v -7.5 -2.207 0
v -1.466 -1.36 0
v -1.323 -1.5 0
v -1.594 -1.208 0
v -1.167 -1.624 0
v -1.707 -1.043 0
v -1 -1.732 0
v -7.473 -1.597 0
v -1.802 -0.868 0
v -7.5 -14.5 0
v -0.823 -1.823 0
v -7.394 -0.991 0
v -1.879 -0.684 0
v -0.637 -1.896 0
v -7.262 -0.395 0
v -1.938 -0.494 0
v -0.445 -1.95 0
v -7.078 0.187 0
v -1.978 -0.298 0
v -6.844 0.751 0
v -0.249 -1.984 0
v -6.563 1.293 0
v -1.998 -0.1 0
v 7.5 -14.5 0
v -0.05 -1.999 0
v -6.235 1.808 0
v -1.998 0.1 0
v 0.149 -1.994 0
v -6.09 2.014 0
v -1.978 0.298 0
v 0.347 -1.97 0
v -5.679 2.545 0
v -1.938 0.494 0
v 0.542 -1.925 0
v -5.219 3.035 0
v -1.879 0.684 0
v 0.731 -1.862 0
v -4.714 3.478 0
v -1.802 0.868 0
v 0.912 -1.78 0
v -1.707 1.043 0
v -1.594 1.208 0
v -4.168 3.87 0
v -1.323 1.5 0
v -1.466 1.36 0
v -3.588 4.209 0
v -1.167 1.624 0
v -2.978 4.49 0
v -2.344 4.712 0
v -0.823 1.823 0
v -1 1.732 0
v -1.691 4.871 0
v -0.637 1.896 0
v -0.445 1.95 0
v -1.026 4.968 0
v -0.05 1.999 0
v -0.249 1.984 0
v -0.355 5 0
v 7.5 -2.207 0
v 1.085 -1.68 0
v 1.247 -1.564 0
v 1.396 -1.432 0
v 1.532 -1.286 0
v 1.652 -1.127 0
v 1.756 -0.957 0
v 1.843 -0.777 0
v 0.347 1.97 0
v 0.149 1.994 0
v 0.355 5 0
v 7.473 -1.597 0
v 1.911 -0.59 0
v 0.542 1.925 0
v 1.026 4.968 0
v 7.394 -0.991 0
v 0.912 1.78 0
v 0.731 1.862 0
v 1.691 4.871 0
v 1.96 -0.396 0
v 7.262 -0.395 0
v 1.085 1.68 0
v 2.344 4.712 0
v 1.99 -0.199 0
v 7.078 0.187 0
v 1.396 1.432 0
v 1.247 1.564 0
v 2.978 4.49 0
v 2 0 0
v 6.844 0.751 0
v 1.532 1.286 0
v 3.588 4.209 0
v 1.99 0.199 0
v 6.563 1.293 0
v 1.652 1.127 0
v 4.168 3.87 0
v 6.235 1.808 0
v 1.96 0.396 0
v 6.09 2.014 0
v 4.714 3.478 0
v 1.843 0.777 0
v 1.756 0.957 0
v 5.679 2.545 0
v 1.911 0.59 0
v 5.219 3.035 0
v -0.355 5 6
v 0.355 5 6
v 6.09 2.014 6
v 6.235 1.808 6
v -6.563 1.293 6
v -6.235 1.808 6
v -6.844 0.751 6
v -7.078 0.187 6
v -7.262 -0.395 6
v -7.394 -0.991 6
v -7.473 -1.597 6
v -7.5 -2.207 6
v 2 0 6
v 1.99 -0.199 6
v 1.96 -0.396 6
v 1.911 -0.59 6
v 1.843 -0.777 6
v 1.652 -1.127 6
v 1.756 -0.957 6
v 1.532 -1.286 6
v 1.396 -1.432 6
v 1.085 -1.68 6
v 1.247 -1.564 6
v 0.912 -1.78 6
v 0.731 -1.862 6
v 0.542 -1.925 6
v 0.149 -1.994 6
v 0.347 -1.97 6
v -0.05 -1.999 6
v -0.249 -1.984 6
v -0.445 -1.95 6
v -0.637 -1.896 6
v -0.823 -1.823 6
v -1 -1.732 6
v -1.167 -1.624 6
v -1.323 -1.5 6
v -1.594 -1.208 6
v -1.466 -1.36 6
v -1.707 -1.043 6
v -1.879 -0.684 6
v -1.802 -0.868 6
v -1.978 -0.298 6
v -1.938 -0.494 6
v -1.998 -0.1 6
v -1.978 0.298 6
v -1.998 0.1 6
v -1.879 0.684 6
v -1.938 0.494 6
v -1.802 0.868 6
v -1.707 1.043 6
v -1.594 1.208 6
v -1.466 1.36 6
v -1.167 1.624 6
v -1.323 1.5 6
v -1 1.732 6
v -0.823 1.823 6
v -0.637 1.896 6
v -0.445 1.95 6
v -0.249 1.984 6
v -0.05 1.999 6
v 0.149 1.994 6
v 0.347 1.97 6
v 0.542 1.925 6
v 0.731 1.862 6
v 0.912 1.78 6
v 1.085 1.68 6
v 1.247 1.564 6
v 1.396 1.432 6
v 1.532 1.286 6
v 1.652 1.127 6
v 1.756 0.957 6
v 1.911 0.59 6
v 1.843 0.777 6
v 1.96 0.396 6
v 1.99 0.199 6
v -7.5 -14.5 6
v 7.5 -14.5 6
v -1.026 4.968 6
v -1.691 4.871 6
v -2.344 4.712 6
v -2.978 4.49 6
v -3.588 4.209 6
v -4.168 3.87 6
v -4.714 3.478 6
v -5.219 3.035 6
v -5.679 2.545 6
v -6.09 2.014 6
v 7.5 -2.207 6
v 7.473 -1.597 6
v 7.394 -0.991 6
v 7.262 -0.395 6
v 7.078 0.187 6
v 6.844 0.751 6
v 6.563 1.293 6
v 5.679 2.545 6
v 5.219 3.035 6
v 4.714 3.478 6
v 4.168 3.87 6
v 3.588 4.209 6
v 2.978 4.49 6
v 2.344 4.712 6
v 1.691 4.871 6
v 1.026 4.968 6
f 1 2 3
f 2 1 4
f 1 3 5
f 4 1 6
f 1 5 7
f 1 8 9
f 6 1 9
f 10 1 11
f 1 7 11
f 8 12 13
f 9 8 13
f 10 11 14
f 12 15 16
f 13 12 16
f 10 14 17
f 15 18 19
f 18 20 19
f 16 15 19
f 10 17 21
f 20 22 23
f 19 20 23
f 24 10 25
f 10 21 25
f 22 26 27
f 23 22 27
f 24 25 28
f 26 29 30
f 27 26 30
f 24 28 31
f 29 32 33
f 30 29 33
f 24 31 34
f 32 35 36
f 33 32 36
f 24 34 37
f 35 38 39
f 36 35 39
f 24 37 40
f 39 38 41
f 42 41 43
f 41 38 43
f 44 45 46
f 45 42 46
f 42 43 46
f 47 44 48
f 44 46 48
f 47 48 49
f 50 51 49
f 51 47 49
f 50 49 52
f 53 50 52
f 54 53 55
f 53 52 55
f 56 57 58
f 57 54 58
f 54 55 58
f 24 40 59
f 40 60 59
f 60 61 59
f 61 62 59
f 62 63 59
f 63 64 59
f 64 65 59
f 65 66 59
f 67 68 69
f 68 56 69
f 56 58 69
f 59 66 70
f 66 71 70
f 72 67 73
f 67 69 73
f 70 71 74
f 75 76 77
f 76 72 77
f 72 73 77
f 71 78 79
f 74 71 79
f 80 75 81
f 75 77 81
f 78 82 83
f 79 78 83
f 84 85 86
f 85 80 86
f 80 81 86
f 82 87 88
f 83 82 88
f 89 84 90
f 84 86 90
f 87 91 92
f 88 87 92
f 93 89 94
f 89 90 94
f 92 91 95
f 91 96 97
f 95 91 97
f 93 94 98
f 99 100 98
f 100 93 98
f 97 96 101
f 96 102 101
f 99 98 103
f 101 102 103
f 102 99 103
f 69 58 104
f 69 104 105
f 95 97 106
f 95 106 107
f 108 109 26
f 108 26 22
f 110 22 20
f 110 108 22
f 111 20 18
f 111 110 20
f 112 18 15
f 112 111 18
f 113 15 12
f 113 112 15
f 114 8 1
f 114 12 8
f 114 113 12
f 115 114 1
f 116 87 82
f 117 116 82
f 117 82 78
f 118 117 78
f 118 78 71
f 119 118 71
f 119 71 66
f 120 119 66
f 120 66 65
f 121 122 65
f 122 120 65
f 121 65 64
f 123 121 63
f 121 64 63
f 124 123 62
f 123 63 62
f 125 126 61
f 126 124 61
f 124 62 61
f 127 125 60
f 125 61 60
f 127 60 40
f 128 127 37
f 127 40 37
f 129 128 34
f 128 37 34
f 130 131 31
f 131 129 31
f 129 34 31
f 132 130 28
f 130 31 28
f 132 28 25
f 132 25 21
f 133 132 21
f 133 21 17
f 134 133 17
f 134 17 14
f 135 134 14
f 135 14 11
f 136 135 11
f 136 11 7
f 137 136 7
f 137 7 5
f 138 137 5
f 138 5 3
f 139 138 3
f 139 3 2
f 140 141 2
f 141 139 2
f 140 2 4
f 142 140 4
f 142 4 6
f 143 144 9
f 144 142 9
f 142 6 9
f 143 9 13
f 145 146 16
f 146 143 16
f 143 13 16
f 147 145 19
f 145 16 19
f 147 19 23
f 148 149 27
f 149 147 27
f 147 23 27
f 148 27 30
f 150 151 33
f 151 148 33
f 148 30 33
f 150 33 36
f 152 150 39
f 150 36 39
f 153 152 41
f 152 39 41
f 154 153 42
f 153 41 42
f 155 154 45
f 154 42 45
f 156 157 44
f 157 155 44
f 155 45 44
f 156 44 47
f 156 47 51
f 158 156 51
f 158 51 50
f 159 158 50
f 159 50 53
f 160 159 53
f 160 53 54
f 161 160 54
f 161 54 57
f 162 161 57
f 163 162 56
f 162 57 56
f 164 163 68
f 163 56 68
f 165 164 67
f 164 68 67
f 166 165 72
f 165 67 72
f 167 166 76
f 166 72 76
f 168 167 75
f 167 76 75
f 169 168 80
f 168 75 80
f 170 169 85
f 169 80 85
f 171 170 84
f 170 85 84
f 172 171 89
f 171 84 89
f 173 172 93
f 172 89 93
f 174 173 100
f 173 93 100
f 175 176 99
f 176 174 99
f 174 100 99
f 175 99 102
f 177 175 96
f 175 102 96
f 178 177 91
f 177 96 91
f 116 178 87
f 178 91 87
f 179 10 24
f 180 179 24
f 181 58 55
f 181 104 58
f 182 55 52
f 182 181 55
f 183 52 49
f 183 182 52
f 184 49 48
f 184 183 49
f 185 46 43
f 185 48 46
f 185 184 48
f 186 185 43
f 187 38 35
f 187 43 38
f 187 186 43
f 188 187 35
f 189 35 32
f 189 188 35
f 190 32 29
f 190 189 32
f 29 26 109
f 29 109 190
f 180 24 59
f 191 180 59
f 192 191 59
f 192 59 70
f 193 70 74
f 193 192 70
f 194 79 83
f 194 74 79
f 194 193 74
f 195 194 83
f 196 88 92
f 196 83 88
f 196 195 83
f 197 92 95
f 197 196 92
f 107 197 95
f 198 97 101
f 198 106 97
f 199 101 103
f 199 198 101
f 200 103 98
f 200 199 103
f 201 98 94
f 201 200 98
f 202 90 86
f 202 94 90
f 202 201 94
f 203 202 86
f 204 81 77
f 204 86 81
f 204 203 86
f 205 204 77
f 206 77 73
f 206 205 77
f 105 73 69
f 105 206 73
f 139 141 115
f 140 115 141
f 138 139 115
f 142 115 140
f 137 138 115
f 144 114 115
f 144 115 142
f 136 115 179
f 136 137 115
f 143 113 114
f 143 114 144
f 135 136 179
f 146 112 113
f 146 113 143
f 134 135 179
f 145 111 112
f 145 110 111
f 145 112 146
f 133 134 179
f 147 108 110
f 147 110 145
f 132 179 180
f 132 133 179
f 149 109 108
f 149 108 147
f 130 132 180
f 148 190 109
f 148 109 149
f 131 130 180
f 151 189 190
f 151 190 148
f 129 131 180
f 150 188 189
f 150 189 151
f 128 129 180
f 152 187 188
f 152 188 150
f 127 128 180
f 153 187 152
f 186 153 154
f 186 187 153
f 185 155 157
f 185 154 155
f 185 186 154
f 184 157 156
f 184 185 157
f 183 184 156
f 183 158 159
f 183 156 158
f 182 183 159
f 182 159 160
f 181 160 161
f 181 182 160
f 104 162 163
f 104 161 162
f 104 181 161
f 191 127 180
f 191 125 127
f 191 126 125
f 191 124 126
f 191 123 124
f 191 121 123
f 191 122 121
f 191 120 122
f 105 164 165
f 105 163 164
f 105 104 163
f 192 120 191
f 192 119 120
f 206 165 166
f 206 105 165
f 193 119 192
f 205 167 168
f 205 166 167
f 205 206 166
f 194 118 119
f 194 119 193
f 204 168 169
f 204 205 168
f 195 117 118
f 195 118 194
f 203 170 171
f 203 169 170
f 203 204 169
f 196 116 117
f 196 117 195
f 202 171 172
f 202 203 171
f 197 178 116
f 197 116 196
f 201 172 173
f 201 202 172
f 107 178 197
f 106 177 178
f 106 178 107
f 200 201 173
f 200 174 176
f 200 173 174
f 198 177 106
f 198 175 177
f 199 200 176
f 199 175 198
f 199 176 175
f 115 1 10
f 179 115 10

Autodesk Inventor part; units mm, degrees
ref_plane "YZ Plane" through (0, 0, 0) normal (1, 0, 0) x (0, 1, 0)
ref_plane "XZ Plane" through (0, 0, 0) normal (0, 1, 0) x (-1, 0, 0)
ref_plane "XY Plane" through (0, 0, 0) normal (0, 0, 1) x (1, 0, 0)
sketch "Эскиз1" plane through (0, 0, 0) normal (0, 0, 1) x (1, 0, 0)
  circle A0 centre (0, 0) radius 2
  line L0 (-7.5, -14.5) -> (7.5, -14.5)
  line L1 (7.5, -14.5) -> (7.5, 0)
  line L2 (7.5, 0) -> (-7.5, 0) construction
  line L3 (-7.5, 0) -> (-7.5, -14.5)
  line L4 (0, -18.7) -> (0, 10.7) construction
  circle A1 centre (0, 0) radius 6.5 construction
  line L5 (-7.5, 0) -> (-4, 5)
  line L6 (-4, 5) -> (4, 5)
  line L7 (4, 5) -> (7.5, 0)
  point P0 (0, 5)
  point P1 (0, -14.5)
  dimension "d0" = 4
  dimension "d6" = 13
  dimension "d8" = 8
  dimension "d11" = 15
  dimension "d12" = 5
  dimension "d13" = 14.5
extrude "Выдавливание1" add sketch "Эскиз1" along normal blind 6
fillet "Сопряжение1" radius 7 4 edges at (-7.5, 0, 3) (-4, 5, 3) (4, 5, 3) (7.5, 0, 3)
properties part number "Крепление шкива"
